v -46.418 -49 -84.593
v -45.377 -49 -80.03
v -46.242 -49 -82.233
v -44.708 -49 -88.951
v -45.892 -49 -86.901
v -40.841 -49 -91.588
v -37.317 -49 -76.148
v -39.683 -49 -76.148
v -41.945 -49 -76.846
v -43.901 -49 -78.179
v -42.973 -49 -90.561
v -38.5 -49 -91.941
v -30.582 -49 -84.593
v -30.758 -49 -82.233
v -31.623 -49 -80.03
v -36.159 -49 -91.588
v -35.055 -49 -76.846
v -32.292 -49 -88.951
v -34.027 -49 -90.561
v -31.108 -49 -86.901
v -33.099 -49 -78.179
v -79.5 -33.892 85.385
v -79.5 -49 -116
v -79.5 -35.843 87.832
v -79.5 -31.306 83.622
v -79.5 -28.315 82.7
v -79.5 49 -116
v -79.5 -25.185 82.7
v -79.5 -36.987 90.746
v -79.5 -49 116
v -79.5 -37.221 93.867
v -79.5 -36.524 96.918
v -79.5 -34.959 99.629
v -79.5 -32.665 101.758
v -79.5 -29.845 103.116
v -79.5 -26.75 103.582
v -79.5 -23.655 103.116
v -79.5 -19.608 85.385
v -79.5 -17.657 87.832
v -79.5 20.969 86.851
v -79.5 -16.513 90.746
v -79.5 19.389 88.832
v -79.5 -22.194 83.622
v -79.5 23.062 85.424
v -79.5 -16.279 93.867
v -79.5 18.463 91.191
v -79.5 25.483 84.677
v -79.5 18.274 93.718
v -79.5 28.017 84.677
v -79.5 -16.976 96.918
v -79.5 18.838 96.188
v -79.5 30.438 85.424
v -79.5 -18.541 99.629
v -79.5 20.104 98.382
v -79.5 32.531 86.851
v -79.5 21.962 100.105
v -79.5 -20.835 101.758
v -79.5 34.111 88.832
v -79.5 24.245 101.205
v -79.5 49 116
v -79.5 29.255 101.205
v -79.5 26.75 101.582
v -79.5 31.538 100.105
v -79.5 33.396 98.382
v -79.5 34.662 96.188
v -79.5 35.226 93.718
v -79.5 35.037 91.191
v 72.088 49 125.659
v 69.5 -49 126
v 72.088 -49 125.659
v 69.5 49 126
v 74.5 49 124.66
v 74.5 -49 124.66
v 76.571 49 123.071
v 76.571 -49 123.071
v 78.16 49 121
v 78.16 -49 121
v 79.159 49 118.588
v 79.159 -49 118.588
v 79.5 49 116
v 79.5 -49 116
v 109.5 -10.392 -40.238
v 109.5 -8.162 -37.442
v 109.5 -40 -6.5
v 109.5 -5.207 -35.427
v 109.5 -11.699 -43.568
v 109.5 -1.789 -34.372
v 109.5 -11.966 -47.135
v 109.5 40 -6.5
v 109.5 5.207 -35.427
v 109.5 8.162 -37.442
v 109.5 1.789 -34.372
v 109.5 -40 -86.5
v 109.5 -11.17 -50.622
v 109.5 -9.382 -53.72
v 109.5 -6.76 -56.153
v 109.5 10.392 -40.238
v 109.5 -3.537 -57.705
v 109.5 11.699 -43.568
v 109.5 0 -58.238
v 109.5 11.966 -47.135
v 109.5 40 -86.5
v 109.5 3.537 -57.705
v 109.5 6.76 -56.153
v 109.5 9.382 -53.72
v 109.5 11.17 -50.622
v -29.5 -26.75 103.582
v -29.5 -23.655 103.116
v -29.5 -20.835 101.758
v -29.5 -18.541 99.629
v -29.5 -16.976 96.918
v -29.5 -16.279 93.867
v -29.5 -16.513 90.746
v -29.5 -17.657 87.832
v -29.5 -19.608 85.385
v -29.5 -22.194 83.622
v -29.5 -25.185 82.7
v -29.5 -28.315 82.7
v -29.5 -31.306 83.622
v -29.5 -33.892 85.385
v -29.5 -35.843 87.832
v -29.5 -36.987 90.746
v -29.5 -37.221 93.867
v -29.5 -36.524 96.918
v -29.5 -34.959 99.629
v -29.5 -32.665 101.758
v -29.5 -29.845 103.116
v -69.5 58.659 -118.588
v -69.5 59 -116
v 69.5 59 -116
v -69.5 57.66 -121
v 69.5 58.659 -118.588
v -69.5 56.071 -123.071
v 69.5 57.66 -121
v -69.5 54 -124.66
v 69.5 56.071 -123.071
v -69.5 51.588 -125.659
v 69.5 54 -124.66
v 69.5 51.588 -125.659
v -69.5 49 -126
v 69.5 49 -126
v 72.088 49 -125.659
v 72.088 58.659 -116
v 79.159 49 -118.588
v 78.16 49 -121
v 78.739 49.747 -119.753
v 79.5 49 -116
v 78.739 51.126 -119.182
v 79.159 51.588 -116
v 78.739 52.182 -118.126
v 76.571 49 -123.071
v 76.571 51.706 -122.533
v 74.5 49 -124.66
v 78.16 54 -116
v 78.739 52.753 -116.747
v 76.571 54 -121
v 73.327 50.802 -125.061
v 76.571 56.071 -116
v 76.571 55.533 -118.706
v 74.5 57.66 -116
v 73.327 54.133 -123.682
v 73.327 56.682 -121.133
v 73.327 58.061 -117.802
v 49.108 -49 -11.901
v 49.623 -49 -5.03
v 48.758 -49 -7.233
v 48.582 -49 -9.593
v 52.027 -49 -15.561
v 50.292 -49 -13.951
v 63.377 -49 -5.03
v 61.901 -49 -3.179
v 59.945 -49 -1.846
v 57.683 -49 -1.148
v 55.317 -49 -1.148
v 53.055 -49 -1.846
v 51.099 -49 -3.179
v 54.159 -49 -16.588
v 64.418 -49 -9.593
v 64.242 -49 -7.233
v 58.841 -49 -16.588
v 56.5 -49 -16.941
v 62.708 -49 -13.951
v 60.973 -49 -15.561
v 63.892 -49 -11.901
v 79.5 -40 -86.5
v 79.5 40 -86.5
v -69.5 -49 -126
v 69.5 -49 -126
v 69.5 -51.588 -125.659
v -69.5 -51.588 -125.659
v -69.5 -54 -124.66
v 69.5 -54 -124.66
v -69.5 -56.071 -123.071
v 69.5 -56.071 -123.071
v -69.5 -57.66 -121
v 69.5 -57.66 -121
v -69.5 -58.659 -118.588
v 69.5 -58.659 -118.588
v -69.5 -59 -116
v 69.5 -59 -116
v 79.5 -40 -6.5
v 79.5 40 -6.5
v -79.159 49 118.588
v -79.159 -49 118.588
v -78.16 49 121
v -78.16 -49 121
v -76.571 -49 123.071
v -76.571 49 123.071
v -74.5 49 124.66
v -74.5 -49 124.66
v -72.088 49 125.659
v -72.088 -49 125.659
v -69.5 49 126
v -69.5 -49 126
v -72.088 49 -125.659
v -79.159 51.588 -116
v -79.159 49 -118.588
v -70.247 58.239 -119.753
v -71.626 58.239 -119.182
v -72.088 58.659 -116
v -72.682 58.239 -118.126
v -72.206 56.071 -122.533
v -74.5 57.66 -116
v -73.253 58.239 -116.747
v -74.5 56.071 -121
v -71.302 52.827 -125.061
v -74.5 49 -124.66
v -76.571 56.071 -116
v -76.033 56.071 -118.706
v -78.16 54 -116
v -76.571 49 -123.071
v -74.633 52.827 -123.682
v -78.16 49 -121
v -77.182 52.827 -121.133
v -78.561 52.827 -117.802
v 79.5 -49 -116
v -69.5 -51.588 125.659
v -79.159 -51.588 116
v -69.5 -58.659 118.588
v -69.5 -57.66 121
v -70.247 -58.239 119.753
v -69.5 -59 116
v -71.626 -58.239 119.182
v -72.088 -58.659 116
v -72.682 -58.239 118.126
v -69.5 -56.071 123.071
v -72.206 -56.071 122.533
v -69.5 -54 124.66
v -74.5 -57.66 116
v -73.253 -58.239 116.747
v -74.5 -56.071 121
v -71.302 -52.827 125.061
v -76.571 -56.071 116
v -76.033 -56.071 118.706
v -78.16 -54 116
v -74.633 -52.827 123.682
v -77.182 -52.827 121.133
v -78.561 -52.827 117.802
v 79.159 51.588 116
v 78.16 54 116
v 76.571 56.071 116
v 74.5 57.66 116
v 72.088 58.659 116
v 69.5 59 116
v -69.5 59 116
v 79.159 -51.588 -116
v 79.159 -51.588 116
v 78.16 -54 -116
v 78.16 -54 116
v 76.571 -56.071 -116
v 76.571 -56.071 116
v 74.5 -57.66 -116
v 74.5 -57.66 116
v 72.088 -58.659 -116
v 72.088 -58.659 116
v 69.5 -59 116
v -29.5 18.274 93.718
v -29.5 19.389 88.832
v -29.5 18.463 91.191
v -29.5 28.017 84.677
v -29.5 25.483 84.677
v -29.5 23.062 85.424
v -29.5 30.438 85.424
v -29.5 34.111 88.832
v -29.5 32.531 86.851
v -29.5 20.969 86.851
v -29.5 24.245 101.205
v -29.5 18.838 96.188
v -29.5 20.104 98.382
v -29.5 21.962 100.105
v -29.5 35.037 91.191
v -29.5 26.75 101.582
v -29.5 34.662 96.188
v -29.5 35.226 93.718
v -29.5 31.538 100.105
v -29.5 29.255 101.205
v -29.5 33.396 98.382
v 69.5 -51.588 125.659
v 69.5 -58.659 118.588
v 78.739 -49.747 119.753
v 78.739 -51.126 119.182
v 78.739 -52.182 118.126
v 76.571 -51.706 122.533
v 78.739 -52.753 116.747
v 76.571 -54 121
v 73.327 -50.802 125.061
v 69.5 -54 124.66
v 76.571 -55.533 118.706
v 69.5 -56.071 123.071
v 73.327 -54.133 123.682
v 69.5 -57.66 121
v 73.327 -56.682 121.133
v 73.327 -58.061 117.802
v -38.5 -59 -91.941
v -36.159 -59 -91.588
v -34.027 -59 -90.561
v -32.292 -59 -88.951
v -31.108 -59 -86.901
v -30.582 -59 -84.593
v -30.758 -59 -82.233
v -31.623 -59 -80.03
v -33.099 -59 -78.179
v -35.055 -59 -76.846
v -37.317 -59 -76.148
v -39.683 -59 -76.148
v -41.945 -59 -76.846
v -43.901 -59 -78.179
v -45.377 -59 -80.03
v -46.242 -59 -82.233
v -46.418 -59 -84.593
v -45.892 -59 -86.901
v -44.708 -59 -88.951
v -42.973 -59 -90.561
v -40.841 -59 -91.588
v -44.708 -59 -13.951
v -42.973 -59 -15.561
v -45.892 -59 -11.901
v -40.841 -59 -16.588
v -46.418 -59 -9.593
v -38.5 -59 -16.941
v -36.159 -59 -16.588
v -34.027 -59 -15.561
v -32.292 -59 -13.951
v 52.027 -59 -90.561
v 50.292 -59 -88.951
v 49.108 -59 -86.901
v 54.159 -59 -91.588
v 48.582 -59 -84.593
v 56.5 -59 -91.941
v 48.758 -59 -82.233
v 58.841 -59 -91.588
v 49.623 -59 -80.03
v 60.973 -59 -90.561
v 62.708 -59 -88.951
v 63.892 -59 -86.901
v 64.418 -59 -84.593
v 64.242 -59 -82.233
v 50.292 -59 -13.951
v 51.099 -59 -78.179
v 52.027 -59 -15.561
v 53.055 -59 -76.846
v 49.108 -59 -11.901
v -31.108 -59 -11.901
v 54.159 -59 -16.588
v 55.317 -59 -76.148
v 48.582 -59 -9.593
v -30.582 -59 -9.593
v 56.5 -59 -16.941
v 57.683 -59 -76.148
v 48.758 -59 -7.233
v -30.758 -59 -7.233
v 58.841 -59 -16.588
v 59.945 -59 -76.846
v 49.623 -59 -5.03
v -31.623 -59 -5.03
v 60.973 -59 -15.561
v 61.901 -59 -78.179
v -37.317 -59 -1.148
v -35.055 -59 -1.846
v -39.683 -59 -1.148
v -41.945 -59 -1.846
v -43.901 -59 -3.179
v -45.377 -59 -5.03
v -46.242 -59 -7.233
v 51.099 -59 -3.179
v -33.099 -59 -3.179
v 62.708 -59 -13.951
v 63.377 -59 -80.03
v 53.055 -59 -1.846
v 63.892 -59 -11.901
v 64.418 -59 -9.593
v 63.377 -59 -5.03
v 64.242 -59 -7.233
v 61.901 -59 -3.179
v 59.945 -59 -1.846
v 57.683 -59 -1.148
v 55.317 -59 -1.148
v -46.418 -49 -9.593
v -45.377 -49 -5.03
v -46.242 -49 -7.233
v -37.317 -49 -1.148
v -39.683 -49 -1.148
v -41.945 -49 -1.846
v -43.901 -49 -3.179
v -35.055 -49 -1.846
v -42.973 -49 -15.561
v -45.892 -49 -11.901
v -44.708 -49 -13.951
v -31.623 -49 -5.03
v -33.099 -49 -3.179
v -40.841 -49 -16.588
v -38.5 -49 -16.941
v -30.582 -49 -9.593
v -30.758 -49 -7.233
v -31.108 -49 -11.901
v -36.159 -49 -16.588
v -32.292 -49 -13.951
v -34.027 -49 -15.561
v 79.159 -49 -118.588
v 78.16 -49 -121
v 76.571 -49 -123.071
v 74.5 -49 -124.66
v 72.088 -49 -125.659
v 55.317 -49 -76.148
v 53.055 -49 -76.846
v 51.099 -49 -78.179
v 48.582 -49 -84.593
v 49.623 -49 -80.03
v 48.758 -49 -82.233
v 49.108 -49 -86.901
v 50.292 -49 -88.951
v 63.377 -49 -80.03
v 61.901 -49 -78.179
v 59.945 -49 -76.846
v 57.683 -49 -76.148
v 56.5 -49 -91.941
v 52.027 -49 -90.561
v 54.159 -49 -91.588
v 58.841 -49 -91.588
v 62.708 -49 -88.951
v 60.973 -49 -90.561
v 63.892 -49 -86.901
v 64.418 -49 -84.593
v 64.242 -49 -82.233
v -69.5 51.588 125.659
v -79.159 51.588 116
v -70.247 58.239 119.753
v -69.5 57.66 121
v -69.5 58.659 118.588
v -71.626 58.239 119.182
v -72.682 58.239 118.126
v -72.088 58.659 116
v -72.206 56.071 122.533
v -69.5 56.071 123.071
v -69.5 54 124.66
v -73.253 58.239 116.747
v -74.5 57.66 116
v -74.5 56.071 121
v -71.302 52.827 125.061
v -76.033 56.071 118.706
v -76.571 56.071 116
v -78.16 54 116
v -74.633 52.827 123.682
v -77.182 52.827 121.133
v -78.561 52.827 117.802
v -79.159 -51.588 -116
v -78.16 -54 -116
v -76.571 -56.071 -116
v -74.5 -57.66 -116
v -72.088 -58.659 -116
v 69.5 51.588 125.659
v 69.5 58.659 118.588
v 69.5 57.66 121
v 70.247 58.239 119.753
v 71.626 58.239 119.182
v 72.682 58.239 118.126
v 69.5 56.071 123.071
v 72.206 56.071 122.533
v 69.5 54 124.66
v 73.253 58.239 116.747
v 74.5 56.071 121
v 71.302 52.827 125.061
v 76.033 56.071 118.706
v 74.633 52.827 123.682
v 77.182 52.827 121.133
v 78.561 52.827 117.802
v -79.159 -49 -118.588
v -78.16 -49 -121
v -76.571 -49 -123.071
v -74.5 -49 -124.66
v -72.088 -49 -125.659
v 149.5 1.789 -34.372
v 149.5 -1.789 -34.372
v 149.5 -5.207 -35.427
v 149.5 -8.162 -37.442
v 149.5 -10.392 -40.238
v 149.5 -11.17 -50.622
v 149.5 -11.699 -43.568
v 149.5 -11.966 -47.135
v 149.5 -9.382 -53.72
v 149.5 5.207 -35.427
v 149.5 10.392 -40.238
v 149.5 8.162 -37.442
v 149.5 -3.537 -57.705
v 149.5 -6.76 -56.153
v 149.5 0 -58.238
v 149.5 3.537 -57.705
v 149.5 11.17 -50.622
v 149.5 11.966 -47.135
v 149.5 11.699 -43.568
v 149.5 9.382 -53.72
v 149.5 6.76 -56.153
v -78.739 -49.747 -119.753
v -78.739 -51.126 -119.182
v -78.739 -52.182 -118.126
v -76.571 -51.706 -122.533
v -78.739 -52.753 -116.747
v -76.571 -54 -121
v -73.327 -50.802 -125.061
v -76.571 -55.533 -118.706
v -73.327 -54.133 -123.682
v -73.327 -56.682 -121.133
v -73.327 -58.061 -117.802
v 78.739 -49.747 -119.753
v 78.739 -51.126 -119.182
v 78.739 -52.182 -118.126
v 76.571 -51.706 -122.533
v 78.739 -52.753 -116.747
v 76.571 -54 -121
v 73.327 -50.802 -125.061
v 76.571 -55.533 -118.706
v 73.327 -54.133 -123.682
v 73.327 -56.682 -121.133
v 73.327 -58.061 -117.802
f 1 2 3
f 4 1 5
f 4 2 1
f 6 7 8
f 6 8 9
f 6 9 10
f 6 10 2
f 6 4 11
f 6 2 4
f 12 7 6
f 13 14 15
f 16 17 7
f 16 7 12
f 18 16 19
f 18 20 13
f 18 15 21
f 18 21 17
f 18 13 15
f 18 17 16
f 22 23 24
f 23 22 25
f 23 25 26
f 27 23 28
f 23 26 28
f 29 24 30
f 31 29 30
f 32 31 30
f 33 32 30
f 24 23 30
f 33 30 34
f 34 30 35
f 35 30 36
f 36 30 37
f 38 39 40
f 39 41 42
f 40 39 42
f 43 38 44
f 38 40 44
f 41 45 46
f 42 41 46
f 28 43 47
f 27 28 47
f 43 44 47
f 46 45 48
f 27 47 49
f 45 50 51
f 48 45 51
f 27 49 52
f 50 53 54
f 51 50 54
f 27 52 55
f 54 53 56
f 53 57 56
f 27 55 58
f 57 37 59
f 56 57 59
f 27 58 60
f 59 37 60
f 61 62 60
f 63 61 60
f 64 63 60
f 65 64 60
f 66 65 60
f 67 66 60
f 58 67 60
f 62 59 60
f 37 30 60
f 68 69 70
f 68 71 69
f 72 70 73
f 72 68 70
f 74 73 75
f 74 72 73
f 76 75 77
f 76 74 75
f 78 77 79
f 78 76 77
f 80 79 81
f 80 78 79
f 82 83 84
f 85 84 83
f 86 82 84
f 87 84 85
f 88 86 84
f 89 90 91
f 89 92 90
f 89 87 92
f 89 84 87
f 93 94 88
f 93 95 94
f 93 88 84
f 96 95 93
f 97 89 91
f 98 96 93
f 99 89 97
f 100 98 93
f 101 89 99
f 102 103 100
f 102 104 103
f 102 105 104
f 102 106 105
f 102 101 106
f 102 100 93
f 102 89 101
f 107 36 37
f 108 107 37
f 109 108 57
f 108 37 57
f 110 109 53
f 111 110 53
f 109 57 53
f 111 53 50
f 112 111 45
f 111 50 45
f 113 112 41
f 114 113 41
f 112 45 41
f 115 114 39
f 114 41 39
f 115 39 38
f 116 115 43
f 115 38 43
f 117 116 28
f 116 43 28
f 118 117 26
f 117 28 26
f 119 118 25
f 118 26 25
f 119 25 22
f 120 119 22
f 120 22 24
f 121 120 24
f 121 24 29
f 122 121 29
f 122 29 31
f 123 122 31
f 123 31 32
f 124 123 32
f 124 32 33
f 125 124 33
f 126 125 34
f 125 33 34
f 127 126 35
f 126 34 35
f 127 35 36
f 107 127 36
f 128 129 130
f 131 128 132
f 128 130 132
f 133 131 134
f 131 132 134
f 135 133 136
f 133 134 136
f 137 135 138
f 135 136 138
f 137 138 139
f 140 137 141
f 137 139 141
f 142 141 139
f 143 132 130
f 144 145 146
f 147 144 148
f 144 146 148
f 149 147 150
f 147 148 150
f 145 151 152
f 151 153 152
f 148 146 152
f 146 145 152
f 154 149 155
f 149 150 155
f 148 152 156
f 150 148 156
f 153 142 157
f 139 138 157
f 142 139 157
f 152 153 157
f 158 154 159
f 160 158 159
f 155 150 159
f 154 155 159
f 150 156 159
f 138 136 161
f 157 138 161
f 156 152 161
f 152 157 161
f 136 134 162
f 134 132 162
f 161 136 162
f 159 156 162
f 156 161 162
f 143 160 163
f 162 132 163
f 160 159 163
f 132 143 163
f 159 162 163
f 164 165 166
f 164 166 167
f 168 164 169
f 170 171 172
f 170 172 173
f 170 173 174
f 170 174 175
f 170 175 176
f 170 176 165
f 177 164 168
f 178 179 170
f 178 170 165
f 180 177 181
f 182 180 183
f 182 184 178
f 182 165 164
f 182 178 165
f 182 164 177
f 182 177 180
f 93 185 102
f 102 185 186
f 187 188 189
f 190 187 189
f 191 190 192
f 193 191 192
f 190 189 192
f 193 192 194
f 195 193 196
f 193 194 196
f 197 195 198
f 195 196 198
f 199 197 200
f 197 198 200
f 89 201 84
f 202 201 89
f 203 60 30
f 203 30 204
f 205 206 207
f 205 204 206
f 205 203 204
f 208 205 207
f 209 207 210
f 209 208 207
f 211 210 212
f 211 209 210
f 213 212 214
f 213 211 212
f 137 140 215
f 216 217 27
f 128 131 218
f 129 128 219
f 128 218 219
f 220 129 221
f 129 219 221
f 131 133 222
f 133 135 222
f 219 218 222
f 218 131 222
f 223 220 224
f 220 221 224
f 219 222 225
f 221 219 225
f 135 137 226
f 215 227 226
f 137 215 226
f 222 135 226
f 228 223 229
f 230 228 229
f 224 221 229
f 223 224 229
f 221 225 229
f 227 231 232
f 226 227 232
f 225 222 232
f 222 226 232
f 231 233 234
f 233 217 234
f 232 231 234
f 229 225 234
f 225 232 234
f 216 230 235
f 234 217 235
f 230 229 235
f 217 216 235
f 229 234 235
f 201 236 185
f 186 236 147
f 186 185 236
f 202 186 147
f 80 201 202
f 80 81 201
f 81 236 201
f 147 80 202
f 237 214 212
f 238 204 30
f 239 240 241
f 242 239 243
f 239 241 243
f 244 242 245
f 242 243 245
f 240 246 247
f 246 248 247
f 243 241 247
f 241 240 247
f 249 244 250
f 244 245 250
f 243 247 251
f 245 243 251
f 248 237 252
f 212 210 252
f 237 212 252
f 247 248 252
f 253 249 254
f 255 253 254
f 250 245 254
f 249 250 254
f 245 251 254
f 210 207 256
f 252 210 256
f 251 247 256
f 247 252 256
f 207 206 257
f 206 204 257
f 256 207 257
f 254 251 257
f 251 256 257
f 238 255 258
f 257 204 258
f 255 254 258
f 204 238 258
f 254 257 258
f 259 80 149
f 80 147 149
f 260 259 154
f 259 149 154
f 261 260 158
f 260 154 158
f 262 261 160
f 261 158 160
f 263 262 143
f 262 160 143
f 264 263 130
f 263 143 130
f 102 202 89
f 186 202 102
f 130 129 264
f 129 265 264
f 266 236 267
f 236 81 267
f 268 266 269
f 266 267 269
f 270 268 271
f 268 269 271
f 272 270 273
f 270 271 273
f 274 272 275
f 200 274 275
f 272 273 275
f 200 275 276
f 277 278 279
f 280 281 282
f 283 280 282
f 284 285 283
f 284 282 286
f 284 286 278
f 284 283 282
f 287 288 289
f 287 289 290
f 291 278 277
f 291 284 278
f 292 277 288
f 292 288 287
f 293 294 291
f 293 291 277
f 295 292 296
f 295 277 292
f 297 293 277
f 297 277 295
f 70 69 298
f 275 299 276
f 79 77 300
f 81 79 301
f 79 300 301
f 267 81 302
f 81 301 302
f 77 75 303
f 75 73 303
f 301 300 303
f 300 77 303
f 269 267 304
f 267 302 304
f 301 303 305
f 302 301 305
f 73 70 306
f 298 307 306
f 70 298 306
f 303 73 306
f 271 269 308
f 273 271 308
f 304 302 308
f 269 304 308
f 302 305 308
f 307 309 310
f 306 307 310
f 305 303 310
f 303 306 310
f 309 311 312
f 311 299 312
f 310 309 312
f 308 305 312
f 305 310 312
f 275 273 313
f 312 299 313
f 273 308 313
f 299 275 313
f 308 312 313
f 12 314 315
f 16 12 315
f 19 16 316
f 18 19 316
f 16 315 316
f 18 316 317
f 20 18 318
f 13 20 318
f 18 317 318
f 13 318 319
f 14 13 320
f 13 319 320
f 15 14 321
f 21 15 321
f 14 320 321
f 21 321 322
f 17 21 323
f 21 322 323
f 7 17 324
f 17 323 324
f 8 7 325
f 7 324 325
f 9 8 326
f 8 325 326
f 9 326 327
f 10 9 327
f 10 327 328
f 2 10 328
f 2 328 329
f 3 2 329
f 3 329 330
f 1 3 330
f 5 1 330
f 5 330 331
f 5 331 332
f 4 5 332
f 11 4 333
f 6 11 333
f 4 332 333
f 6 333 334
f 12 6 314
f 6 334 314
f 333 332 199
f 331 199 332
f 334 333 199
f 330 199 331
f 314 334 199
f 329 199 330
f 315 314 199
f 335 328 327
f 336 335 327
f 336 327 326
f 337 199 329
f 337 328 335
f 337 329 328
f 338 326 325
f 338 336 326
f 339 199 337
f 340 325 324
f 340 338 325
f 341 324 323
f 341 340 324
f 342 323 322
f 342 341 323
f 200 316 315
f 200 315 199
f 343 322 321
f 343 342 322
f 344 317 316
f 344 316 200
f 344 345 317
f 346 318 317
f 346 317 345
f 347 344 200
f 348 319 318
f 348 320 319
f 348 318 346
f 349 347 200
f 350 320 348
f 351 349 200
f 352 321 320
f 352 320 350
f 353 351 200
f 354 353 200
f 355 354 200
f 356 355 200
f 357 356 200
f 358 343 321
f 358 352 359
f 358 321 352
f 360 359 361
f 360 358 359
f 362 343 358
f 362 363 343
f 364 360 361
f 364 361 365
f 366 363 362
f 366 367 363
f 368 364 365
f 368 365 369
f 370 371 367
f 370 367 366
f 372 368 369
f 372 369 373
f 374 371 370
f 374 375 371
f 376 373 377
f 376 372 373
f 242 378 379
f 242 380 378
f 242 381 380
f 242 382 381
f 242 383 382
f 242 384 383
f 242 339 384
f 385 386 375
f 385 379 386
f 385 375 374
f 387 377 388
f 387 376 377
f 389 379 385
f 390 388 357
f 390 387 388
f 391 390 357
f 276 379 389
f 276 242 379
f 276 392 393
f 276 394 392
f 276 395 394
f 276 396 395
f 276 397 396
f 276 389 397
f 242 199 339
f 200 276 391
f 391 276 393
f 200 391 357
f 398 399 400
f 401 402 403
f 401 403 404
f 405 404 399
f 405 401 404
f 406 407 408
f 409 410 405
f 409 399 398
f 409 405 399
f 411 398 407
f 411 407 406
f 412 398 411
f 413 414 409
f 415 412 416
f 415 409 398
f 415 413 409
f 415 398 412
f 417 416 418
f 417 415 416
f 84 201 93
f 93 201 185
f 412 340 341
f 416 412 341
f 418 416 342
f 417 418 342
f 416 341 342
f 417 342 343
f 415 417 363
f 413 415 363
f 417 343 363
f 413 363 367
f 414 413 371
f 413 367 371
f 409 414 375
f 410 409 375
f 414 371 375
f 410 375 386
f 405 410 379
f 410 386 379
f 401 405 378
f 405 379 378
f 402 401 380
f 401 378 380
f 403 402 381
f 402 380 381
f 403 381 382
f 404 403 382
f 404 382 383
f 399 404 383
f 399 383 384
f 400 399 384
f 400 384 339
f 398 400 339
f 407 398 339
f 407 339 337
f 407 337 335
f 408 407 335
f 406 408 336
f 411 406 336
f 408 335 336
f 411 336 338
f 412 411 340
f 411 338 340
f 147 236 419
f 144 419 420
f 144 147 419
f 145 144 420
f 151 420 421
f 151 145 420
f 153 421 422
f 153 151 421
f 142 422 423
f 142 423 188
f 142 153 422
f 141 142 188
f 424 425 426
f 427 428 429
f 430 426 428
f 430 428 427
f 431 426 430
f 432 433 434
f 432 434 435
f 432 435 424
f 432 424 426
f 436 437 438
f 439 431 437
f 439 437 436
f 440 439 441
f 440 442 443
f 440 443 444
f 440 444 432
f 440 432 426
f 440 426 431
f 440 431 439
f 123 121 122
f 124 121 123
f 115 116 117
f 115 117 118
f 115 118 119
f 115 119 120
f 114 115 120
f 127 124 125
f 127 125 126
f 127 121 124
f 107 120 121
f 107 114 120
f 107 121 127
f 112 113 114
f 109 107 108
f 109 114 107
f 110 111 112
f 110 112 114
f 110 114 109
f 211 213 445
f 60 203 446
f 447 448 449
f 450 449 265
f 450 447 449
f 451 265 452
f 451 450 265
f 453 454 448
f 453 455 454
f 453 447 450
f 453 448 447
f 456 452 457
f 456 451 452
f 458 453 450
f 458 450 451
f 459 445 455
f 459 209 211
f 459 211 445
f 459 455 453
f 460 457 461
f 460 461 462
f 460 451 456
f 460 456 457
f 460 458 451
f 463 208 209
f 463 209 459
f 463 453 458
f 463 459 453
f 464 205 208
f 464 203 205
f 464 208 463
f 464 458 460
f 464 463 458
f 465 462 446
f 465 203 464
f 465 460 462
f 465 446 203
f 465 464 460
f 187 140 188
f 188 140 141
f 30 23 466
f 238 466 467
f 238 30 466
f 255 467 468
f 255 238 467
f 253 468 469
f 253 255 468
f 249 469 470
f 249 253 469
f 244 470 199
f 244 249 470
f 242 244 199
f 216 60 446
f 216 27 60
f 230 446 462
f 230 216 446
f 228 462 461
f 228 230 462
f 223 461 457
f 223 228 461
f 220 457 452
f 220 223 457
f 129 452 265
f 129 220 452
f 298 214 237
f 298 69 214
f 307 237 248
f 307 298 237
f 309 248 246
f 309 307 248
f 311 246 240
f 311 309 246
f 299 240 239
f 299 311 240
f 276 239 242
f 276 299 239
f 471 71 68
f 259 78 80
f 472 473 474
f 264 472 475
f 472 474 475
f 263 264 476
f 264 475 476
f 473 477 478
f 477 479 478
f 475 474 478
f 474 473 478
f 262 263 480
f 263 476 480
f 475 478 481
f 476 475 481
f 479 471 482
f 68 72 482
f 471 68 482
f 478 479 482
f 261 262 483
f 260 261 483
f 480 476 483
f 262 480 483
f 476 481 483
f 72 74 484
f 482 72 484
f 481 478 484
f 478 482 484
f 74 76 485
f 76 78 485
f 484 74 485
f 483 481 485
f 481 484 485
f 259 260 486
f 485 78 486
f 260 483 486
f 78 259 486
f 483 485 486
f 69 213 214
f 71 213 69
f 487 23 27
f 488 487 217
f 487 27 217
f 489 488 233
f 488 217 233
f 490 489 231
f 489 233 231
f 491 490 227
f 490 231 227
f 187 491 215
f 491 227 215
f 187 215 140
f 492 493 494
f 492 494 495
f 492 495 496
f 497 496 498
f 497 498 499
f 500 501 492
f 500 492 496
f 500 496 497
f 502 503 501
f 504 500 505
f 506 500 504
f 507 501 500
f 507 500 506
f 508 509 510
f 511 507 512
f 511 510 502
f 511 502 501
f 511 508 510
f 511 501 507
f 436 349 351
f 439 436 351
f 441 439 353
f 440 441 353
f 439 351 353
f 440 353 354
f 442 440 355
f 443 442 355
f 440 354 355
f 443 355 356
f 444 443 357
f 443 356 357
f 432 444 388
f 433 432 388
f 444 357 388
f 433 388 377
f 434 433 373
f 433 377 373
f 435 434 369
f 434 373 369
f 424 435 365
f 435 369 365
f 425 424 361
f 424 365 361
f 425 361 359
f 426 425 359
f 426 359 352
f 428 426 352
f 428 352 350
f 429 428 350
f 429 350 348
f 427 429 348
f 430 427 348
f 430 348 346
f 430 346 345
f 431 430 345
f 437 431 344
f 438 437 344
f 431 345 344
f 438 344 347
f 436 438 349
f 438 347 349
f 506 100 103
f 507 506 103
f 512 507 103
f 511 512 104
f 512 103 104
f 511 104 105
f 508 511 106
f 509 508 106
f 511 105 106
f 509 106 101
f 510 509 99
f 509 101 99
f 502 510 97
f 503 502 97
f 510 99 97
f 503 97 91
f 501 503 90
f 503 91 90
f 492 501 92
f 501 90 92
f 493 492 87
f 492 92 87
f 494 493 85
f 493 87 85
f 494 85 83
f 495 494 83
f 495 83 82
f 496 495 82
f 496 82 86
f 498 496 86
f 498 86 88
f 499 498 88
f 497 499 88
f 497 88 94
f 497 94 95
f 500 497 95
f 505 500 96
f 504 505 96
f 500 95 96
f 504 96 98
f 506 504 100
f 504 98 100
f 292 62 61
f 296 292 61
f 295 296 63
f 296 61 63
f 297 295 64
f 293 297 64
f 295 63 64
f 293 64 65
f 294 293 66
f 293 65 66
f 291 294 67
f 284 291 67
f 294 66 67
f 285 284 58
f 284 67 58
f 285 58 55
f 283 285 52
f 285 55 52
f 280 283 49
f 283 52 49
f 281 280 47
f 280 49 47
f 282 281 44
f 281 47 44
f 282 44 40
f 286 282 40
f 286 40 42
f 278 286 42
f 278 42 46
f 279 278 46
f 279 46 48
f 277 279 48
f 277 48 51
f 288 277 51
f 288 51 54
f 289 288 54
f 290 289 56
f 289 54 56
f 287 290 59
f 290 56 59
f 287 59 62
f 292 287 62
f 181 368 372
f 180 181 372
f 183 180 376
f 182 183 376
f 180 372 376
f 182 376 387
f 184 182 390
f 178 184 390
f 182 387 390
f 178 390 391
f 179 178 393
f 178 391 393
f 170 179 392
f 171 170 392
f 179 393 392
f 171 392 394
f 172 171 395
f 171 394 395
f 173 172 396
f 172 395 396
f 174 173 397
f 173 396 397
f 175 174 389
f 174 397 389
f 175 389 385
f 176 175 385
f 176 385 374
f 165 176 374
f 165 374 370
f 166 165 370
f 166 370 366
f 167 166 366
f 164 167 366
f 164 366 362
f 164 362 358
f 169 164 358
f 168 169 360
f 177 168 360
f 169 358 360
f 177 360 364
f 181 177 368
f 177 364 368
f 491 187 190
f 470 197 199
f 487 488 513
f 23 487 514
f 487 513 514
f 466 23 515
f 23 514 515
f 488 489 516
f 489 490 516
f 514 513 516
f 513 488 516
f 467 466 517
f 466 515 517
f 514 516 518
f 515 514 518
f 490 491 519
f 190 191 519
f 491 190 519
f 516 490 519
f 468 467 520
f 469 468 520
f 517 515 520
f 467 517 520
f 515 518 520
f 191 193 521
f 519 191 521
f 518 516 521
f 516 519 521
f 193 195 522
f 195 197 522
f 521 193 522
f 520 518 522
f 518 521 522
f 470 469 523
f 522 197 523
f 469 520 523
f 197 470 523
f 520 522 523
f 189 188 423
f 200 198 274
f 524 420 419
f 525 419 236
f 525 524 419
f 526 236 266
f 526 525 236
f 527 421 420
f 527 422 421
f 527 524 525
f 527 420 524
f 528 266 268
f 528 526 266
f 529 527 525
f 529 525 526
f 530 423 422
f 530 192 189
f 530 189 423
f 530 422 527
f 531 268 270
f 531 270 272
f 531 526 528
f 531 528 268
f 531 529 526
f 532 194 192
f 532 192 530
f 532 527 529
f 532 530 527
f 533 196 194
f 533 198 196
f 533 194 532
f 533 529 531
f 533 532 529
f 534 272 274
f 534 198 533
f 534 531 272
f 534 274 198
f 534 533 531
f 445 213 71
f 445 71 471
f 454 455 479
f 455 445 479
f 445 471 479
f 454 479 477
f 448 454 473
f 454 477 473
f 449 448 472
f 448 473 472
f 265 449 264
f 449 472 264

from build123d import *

# Parameters (mm, degrees)
SKETCH1_W           = 159
SKETCH1_H           = 118
BOSS_EXTRUDE1_DEPTH = 126
FILLET1_R           = 10
SKETCH6_W           = 80
SKETCH6_H           = 80
BOSS_EXTRUDE2_DEPTH = 30
SKETCH7_R           = 12
BOSS_EXTRUDE3_DEPTH = 40
SKETCH11_R          = 8.5
SKETCH11_R_2        = 10.5
CUT_EXTRUDE5_DEPTH  = 50
SKETCH12_R          = 7.94064545
CUT_EXTRUDE6_DEPTH  = 10


with BuildPart() as part:
    # Sketch1 → Boss-Extrude1 (new, symmetric)
    with BuildSketch(Plane.XY):
        Rectangle(SKETCH1_W, SKETCH1_H)
    extrude(amount=BOSS_EXTRUDE1_DEPTH, both=True)

    # Fillet1
    fillet1_edges = [part.edges().sort_by_distance(p)[0] for p in [
        (-79.5, 0, 126),
        (0, -59, 126),
        (79.5, 0, 126),
        (0, -59, -126),
        (-79.5, 0, -126),
        (0, 59, -126),
        (79.5, 0, -126),
        (0, 59, 126),
        (79.5, -59, 0),
        (-79.5, -59, 0),
        (-79.5, 59, 0),
        (79.5, 59, 0),
    ]]
    fillet(fillet1_edges, radius=FILLET1_R)

    # Sketch6 → Boss-Extrude2 (add)
    with BuildSketch(Plane(origin=(79.5, 0, 0), x_dir=(0, 0, -1), z_dir=(1, 0, 0))):
        with Locations((46.5, 0)):
            Rectangle(SKETCH6_W, SKETCH6_H)
    extrude(amount=BOSS_EXTRUDE2_DEPTH)

    # Sketch7 → Boss-Extrude3 (add)
    with BuildSketch(Plane(origin=(109.5, 0, 0), x_dir=(0, 0, -1), z_dir=(1, 0, 0))):
        with Locations((46.238380337, 0)):
            Circle(SKETCH7_R)
    extrude(amount=BOSS_EXTRUDE3_DEPTH)

    # Sketch11 → Cut-Extrude5 (cut)
    with BuildSketch(Plane.ZY.offset(79.5)):
        with Locations((93.08230214, 26.75)):
            Circle(SKETCH11_R)
        with Locations((93.08230214, -26.75)):
            Circle(SKETCH11_R_2)
    extrude(amount=-CUT_EXTRUDE5_DEPTH, mode=Mode.SUBTRACT)

    # Sketch12 → Cut-Extrude6 (cut)
    with BuildSketch(Plane.XZ.offset(59)):
        with Locations(Location((-38.5, -84, 0), (0, 0, 270))):
            Circle(SKETCH12_R)
        with Locations(Location((56.5, -84, 0), (0, 0, 270))):
            Circle(SKETCH12_R)
        with Locations(Location((56.5, -9, 0), (0, 0, 270))):
            Circle(SKETCH12_R)
        with Locations(Location((-38.5, -9, 0), (0, 0, 270))):
            Circle(SKETCH12_R)
    extrude(amount=-CUT_EXTRUDE6_DEPTH, mode=Mode.SUBTRACT)


solid = part.part
